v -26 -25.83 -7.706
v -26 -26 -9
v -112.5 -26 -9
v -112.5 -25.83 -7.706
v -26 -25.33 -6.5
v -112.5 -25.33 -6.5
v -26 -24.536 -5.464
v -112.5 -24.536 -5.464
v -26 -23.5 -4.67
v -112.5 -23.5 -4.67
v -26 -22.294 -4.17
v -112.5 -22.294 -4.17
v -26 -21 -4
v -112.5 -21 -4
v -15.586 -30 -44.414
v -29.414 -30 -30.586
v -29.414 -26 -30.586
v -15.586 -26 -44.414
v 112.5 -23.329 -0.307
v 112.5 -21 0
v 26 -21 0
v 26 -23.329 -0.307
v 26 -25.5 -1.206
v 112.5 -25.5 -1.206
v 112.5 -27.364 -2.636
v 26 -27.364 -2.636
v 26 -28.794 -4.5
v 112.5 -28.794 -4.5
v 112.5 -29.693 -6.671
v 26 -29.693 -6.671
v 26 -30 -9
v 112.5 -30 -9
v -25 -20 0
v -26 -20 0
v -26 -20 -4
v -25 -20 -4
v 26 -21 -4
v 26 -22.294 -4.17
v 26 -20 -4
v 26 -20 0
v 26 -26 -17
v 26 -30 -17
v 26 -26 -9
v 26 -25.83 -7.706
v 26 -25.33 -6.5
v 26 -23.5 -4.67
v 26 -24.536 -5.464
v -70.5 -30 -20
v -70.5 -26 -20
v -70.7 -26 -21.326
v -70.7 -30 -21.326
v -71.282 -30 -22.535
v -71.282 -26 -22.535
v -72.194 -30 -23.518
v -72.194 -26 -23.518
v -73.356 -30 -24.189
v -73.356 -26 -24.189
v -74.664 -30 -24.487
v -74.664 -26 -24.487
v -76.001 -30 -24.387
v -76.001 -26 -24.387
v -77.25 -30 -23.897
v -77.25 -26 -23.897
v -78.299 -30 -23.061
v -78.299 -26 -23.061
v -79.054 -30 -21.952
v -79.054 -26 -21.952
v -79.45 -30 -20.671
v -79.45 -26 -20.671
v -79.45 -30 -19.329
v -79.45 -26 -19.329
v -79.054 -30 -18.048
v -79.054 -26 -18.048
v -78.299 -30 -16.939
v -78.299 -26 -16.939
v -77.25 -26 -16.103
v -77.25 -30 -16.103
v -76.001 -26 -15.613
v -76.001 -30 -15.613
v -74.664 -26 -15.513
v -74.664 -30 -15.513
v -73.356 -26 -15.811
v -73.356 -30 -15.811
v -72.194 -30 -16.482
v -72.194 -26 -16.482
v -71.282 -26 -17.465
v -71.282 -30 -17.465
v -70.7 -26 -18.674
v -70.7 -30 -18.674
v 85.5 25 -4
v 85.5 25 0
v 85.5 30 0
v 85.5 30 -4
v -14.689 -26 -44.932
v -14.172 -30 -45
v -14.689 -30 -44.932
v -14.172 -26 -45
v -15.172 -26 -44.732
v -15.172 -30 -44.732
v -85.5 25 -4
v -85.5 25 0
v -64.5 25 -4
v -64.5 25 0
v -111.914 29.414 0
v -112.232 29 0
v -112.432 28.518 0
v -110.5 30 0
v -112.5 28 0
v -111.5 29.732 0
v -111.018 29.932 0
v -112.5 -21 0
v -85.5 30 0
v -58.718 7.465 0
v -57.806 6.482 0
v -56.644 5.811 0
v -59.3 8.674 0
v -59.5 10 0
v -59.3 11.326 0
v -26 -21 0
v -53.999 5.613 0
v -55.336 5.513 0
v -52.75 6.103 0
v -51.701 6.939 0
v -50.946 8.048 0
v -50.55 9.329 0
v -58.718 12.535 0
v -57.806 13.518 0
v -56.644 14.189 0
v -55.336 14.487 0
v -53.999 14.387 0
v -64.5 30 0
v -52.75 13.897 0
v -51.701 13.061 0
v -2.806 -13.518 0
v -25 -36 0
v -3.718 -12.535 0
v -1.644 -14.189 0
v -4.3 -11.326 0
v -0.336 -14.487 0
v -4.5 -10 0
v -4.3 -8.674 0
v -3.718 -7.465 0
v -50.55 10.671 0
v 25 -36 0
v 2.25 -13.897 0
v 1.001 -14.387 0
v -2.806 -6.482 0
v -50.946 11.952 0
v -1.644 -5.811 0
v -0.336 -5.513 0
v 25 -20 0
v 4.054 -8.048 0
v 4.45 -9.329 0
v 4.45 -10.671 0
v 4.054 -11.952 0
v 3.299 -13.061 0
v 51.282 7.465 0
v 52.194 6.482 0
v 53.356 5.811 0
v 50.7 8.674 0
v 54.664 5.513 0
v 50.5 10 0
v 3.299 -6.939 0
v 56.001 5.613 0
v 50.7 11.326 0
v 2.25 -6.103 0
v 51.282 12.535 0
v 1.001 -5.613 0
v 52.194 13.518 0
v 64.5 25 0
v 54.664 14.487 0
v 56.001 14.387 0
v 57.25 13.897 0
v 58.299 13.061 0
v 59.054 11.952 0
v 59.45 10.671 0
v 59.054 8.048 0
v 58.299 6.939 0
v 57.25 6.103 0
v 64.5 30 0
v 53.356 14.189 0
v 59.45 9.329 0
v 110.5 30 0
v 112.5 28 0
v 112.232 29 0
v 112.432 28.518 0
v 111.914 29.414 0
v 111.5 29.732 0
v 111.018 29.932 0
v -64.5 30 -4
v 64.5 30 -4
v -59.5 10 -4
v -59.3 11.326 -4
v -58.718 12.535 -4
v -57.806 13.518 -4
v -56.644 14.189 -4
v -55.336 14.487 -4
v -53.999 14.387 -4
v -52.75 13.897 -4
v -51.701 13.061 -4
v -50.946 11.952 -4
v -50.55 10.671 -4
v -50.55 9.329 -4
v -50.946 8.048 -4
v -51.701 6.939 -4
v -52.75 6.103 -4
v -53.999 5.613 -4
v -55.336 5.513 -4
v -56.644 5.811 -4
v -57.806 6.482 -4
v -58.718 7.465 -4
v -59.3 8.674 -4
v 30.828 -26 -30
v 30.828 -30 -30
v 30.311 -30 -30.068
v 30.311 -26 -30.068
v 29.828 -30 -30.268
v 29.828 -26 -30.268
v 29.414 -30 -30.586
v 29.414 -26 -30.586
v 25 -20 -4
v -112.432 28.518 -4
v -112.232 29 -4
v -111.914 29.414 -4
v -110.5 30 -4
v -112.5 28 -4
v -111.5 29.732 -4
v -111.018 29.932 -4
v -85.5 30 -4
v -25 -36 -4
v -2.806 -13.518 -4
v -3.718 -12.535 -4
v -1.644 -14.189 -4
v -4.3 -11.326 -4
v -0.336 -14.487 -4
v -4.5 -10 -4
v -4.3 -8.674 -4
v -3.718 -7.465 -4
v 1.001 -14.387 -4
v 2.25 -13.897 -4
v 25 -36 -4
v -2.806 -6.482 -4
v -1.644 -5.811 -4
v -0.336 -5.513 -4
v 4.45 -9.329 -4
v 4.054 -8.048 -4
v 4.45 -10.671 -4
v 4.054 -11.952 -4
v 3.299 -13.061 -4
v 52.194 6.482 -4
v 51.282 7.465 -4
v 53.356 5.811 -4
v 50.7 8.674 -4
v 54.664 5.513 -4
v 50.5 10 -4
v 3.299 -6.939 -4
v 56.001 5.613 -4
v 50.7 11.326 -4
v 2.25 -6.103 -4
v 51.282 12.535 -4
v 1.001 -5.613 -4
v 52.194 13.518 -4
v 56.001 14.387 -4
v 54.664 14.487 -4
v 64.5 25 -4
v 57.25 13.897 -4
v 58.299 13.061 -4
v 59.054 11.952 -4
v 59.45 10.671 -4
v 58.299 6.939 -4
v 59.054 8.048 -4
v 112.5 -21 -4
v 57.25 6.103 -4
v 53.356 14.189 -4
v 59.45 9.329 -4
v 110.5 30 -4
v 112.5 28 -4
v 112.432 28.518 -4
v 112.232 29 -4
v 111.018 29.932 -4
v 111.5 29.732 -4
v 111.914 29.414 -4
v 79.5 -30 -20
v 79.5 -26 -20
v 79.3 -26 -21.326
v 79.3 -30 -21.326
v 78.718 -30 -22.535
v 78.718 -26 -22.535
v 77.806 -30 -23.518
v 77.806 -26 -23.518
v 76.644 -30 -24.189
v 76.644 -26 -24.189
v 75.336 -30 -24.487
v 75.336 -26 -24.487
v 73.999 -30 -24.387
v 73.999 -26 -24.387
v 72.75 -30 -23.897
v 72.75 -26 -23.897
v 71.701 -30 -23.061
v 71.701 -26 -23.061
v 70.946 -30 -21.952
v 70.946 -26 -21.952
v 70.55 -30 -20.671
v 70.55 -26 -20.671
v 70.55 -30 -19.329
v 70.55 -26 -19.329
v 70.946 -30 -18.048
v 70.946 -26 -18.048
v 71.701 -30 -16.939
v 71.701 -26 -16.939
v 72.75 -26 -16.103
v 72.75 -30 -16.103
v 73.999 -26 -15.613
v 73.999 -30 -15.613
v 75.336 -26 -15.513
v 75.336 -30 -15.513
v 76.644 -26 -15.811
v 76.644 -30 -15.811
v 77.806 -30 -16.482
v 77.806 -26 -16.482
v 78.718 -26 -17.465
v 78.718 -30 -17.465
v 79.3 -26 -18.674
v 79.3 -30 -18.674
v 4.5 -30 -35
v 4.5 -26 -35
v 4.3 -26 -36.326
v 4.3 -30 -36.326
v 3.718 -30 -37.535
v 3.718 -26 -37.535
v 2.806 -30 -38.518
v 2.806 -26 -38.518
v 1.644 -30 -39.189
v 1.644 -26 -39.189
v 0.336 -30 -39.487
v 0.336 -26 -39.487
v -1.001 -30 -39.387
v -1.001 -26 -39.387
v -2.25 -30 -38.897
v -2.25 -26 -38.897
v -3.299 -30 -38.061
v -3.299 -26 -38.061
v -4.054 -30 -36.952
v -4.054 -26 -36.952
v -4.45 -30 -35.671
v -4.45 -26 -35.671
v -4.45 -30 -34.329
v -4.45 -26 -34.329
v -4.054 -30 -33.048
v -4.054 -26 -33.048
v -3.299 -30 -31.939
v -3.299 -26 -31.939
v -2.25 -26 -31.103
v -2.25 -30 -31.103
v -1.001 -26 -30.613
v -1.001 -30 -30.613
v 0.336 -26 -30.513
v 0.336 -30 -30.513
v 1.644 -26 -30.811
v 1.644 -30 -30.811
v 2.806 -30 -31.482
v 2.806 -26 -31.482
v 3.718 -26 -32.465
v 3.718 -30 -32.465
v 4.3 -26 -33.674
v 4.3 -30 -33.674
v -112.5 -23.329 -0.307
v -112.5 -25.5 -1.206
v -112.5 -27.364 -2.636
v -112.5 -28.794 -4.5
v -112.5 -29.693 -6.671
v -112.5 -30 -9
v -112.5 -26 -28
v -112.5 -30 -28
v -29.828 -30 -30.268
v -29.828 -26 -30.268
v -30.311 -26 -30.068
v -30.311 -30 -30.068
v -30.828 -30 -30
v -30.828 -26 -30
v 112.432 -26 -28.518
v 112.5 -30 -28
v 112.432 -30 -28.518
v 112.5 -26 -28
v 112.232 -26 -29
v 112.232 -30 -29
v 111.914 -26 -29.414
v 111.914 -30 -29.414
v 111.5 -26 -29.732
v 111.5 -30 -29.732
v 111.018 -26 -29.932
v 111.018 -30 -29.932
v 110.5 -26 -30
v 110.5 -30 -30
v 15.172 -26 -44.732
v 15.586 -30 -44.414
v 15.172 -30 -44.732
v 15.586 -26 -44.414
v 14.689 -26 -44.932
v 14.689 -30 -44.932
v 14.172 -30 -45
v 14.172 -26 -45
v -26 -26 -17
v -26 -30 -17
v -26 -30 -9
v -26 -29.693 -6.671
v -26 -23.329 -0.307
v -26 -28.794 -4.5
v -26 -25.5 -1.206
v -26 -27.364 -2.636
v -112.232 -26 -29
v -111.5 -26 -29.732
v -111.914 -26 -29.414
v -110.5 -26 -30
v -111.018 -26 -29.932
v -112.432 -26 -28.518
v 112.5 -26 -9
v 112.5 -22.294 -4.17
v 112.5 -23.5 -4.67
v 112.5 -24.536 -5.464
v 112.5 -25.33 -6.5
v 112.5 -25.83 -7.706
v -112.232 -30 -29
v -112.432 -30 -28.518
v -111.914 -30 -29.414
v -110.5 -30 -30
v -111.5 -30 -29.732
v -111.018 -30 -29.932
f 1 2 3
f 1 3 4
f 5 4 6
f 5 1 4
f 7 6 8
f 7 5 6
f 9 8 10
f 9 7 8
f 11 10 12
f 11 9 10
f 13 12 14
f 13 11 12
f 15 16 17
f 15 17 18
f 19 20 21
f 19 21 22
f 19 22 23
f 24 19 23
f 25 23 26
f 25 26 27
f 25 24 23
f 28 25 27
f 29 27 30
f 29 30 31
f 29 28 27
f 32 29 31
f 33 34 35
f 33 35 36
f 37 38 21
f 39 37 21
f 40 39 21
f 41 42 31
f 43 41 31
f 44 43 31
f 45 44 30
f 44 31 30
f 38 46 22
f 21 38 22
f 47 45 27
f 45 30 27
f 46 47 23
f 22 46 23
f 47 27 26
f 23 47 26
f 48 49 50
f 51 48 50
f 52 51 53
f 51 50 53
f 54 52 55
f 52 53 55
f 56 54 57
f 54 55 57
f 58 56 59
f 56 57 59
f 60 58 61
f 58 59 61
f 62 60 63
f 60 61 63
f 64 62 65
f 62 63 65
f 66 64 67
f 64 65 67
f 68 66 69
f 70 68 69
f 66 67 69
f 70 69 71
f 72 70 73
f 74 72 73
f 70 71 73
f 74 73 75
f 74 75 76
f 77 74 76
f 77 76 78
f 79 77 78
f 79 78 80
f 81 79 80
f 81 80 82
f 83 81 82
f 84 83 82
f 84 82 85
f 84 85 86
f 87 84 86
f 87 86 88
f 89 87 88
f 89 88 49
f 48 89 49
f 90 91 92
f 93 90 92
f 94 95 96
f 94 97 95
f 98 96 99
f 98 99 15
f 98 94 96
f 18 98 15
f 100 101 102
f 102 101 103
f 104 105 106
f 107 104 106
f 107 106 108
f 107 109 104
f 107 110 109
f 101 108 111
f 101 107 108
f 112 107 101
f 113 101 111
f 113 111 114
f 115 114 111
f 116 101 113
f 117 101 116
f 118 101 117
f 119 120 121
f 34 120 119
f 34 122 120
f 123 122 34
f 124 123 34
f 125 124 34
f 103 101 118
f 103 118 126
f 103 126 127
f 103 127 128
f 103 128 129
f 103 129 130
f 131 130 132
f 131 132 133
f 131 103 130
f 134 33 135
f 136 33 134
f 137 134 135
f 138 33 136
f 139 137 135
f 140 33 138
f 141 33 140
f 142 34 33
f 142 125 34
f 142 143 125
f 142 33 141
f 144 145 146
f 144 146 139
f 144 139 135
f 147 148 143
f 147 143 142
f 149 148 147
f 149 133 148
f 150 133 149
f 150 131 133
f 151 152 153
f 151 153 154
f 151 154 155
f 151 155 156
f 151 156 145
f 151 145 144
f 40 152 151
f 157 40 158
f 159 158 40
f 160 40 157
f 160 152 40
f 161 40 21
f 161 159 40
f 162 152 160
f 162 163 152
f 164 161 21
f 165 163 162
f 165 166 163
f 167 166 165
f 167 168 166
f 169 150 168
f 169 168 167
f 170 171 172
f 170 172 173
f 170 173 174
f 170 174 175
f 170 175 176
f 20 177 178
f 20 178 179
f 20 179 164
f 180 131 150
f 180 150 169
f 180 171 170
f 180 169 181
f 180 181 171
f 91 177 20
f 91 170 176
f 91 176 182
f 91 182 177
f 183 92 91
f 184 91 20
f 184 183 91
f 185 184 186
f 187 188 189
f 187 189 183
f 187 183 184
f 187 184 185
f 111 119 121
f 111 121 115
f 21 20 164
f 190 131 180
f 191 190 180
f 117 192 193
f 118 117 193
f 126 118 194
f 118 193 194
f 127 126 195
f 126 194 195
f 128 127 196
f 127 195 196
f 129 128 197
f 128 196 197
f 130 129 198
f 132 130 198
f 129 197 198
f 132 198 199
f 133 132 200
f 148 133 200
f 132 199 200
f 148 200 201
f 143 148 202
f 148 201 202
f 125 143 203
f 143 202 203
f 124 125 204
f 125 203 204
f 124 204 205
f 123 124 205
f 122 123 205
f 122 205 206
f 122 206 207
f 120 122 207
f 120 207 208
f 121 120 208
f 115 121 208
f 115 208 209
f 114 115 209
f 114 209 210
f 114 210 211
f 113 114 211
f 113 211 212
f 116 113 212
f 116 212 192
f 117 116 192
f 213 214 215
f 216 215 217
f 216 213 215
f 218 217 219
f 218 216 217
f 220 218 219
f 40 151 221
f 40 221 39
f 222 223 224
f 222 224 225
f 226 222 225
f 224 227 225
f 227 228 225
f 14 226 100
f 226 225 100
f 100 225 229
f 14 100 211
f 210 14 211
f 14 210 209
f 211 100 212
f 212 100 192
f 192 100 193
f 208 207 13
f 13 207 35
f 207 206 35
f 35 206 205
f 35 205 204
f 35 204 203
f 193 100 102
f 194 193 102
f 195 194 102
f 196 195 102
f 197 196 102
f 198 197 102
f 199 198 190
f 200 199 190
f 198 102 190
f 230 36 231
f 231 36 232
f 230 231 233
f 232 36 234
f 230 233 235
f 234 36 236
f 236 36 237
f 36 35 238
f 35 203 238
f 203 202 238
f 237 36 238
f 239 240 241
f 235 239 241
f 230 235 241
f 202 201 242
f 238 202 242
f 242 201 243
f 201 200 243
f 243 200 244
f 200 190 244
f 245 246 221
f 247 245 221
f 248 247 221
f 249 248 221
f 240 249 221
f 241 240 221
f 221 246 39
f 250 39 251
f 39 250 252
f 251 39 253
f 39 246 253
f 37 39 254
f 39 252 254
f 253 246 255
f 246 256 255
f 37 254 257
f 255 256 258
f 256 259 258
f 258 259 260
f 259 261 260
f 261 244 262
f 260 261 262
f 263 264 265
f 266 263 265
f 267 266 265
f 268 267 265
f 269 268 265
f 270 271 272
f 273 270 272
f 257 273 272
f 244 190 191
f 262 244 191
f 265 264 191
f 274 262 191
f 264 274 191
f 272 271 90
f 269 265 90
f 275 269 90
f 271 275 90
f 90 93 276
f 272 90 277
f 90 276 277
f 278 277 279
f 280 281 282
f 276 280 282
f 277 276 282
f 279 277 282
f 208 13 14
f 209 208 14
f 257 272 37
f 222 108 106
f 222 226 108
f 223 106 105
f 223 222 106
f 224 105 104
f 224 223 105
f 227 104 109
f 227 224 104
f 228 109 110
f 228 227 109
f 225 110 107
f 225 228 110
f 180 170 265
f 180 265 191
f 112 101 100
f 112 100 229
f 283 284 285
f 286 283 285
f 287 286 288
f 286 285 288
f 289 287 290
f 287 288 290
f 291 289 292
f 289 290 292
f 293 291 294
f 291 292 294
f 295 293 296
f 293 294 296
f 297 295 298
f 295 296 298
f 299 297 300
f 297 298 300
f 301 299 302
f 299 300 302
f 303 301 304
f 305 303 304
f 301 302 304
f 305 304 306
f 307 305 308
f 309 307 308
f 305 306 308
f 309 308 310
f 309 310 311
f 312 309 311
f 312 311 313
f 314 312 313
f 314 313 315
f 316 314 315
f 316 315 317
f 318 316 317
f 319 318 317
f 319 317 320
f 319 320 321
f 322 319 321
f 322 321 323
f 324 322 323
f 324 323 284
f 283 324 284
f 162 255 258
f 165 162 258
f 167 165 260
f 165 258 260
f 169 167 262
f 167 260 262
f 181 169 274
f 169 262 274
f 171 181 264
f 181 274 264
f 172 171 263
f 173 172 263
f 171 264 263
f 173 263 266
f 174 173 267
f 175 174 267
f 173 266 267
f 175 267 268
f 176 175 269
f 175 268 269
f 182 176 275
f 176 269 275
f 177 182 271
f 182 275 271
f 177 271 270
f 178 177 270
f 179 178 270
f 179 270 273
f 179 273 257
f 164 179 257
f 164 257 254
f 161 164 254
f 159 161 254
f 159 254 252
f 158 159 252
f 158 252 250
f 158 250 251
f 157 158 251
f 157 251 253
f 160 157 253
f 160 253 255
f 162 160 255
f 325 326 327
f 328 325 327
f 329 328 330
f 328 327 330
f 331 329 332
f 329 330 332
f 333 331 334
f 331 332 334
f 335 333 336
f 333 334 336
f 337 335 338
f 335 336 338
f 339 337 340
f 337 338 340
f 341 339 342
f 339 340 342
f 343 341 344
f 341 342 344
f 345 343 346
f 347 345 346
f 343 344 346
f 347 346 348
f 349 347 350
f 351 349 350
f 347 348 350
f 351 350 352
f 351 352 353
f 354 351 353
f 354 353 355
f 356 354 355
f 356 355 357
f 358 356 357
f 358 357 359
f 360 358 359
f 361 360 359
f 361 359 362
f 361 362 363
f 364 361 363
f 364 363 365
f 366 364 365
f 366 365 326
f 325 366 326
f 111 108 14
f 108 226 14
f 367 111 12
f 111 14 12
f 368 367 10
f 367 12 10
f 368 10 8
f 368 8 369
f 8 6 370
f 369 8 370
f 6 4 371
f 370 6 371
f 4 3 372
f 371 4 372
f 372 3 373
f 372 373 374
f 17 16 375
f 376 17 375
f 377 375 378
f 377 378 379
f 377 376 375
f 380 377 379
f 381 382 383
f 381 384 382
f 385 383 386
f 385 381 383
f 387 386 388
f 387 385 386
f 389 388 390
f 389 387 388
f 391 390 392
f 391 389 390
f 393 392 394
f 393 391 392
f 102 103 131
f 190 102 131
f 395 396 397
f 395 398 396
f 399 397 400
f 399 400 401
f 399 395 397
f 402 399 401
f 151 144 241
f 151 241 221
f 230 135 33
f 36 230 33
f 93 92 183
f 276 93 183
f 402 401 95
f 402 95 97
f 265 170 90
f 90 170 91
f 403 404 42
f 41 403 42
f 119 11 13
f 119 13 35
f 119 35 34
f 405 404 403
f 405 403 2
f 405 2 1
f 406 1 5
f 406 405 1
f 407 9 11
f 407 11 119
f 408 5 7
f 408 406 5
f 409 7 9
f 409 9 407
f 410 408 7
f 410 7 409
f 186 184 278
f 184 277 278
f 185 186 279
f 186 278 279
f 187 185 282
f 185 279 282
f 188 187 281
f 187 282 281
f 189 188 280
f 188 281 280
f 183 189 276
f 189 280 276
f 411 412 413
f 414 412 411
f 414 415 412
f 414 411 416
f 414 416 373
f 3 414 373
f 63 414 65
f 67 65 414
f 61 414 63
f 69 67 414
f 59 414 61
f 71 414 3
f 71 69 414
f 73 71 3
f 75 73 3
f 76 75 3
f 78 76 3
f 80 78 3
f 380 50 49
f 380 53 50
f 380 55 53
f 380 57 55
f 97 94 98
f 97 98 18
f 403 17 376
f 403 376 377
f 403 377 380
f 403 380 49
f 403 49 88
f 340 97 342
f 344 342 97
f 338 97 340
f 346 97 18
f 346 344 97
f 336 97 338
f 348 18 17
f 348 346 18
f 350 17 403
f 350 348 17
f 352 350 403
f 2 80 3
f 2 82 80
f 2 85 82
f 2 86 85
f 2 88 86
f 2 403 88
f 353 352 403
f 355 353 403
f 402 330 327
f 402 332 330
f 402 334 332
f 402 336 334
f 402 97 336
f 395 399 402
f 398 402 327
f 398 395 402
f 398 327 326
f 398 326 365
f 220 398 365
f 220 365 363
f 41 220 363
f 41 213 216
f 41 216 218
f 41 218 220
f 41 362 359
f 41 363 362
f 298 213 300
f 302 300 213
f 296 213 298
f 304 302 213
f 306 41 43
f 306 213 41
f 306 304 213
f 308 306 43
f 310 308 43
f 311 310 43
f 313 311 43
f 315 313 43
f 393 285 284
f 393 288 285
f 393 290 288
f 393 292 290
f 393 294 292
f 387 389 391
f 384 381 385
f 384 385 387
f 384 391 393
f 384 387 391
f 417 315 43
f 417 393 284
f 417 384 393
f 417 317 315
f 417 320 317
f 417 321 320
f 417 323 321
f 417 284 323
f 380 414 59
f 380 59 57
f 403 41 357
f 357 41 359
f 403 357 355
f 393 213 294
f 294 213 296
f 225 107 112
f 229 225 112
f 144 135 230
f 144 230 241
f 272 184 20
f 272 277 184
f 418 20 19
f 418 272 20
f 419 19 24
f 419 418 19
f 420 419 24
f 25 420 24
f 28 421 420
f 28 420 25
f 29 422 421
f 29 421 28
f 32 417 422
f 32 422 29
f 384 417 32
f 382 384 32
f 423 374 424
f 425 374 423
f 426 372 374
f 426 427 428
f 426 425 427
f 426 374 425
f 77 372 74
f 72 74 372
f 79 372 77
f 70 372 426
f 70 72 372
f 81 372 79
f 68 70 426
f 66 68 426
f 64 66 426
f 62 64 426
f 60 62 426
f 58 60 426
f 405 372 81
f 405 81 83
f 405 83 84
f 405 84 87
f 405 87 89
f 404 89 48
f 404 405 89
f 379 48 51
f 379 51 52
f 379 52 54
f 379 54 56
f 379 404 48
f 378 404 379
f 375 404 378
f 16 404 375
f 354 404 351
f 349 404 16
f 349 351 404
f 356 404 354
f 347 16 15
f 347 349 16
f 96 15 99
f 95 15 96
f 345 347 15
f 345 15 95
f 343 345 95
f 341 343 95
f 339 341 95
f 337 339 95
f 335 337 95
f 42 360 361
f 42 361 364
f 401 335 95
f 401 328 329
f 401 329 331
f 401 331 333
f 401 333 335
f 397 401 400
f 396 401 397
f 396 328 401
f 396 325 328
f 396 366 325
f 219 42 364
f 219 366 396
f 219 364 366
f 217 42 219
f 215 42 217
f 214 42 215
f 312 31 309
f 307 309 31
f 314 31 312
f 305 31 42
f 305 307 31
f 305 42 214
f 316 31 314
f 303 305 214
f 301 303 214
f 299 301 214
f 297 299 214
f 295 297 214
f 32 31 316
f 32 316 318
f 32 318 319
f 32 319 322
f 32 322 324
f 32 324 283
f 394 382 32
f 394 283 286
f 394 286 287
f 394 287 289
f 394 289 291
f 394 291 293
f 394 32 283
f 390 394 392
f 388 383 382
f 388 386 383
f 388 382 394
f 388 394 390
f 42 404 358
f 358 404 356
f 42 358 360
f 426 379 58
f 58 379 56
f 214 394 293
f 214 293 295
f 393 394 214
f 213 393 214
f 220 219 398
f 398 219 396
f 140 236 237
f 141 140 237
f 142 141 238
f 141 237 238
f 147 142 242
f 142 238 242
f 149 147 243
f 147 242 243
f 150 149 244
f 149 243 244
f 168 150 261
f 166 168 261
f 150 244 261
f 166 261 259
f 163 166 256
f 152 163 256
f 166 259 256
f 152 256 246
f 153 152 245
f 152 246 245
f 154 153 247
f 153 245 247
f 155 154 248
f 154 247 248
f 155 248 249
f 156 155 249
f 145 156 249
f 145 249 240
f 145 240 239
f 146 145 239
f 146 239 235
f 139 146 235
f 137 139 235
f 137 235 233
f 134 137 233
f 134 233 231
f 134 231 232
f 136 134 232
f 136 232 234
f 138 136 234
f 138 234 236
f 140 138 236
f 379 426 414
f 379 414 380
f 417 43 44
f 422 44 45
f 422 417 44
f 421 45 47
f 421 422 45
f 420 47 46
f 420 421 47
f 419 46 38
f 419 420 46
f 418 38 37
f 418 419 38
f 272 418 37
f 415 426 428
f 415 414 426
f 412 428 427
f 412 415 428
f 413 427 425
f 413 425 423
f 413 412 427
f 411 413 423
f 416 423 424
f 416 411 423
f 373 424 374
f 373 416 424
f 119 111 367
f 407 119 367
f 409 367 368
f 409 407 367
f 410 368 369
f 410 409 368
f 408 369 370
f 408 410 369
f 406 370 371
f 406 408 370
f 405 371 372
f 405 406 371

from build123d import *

# Parameters (mm, degrees)
SKETCH_6_W                       = 225
SKETCH_6_H                       = 60
SM_BASE_FLANGE_1_DEPTH           = 4
SM_EDGE_FLANGE_1_STRIP_W         = 26
SM_EDGE_FLANGE_1_STRIP_H         = 4
SM_EDGE_FLANGE_1_STRIP_CUT_DEPTH = 225
SM_EDGE_FLANGE_1_DEPTH           = 225
CUT_EXTRUDE_2_DEPTH              = 5
HOLE_WIZARD_M81_D                = 9
SKETCH_21_W                      = 52
SKETCH_21_H                      = 17
CUT_EXTRUDE_3_DEPTH              = 10
SKETCH_22_W                      = 50
SKETCH_22_H                      = 16
EXTRUDE_1_DEPTH                  = 4
SKETCH_23_W                      = 21
SKETCH_23_H                      = 5
CUT_EXTRUDE_4_DEPTH              = 10
SKETCH_26_R                      = 4.5
CUT_EXTRUDE_5_DEPTH              = 15
FILLET_1_R                       = 2


# Sheet-metal steps are written as plain solids
with BuildPart() as part:
    # Эскиз6 → Базовая кромка1 (new body)
    with BuildSketch(Plane.XY):
        Rectangle(SKETCH_6_W, SKETCH_6_H)
    extrude(amount=-SM_BASE_FLANGE_1_DEPTH)

    # Ребро-кромка1 strip (across the edge) → Ребро-кромка1 strip cut (cut)
    with BuildSketch(Plane(origin=(112.5, -30, -4), x_dir=(0, 1, 0), z_dir=(-1, 0, 0))):
        with Locations((-4, -2)):
            Rectangle(SM_EDGE_FLANGE_1_STRIP_W, SM_EDGE_FLANGE_1_STRIP_H)
    extrude(amount=SM_EDGE_FLANGE_1_STRIP_CUT_DEPTH, mode=Mode.SUBTRACT)

    # Ребро-кромка1 section (across the edge) → Ребро-кромка1 (add)
    with BuildSketch(Plane(origin=(112.5, -30, -4), x_dir=(0, 1, 0), z_dir=(-1, 0, 0))):
        with BuildLine():
            Line((0, 5), (0, 41))
            Line((0, 41), (4, 41))
            Line((4, 41), (4, 5))
            ThreePointArc((4, 5), (5.464466094, 1.464466094), (9, 0))
            Line((9, 0), (9, -4))
            ThreePointArc((9, -4), (2.636038969, -1.363961031), (0, 5))
        make_face()
    extrude(amount=SM_EDGE_FLANGE_1_DEPTH)

    # Эскиз15 → Вырез-Вытянуть2 (cut)
    with BuildSketch(Plane.XZ.offset(30)):
        Polygon((-112.5, -45), (-112.5, -30), (-30, -30), (-15, -45), align=None)
        Polygon((15, -45), (112.5, -45), (112.5, -30), (30, -30), align=None)
    extrude(amount=-CUT_EXTRUDE_2_DEPTH, mode=Mode.SUBTRACT)

    # Отверстие с зазором M81 (through all)
    with Locations(Plane(origin=(0, -30, 0), x_dir=(-1, 0, 0), z_dir=(0, -1, 0))):
        with Locations((-75, 20), (75, 20), (0, 35)):
            Hole(HOLE_WIZARD_M81_D / 2)

    # Эскиз21 → Вырез-Вытянуть3 (cut)
    with BuildSketch(Plane.XZ.offset(30)):
        with Locations((0, -8.5)):
            Rectangle(SKETCH_21_W, SKETCH_21_H)
    extrude(amount=-CUT_EXTRUDE_3_DEPTH, mode=Mode.SUBTRACT)

    # Эскиз22 → Бобышка-Вытянуть1 (add)
    with BuildSketch(Plane.XY):
        with Locations((0, -28)):
            Rectangle(SKETCH_22_W, SKETCH_22_H)
    extrude(amount=-EXTRUDE_1_DEPTH)

    # Эскиз23 → Вырез-Вытянуть4 (cut)
    with BuildSketch(Plane.XY):
        with Locations((-75, 27.5)):
            Rectangle(SKETCH_23_W, SKETCH_23_H)
        with Locations((75, 27.5)):
            Rectangle(SKETCH_23_W, SKETCH_23_H)
    extrude(amount=-CUT_EXTRUDE_4_DEPTH, mode=Mode.SUBTRACT)

    # Эскиз26 → Вырез-Вытянуть5 (cut)
    with BuildSketch(Plane(origin=(0, 0, -4), x_dir=(-1, 0, 0), z_dir=(0, 0, -1))):
        with Locations((-55, 10)):
            Circle(SKETCH_26_R)
        with Locations((55, 10)):
            Circle(SKETCH_26_R)
        with Locations((0, -10)):
            Circle(SKETCH_26_R)
    extrude(amount=-CUT_EXTRUDE_5_DEPTH, mode=Mode.SUBTRACT)

    # Скругление1
    fillet_1_edges = [part.edges().sort_by_distance(p)[0] for p in [
        (15, -28, -45),
        (-15, -28, -45),
        (-112.5, -28, -30),
        (-30, -28, -30),
        (30, -28, -30),
        (112.5, -28, -30),
        (-112.5, 30, -2),
        (112.5, 30, -2),
    ]]
    fillet(fillet_1_edges, radius=FILLET_1_R)


solid = part.part
